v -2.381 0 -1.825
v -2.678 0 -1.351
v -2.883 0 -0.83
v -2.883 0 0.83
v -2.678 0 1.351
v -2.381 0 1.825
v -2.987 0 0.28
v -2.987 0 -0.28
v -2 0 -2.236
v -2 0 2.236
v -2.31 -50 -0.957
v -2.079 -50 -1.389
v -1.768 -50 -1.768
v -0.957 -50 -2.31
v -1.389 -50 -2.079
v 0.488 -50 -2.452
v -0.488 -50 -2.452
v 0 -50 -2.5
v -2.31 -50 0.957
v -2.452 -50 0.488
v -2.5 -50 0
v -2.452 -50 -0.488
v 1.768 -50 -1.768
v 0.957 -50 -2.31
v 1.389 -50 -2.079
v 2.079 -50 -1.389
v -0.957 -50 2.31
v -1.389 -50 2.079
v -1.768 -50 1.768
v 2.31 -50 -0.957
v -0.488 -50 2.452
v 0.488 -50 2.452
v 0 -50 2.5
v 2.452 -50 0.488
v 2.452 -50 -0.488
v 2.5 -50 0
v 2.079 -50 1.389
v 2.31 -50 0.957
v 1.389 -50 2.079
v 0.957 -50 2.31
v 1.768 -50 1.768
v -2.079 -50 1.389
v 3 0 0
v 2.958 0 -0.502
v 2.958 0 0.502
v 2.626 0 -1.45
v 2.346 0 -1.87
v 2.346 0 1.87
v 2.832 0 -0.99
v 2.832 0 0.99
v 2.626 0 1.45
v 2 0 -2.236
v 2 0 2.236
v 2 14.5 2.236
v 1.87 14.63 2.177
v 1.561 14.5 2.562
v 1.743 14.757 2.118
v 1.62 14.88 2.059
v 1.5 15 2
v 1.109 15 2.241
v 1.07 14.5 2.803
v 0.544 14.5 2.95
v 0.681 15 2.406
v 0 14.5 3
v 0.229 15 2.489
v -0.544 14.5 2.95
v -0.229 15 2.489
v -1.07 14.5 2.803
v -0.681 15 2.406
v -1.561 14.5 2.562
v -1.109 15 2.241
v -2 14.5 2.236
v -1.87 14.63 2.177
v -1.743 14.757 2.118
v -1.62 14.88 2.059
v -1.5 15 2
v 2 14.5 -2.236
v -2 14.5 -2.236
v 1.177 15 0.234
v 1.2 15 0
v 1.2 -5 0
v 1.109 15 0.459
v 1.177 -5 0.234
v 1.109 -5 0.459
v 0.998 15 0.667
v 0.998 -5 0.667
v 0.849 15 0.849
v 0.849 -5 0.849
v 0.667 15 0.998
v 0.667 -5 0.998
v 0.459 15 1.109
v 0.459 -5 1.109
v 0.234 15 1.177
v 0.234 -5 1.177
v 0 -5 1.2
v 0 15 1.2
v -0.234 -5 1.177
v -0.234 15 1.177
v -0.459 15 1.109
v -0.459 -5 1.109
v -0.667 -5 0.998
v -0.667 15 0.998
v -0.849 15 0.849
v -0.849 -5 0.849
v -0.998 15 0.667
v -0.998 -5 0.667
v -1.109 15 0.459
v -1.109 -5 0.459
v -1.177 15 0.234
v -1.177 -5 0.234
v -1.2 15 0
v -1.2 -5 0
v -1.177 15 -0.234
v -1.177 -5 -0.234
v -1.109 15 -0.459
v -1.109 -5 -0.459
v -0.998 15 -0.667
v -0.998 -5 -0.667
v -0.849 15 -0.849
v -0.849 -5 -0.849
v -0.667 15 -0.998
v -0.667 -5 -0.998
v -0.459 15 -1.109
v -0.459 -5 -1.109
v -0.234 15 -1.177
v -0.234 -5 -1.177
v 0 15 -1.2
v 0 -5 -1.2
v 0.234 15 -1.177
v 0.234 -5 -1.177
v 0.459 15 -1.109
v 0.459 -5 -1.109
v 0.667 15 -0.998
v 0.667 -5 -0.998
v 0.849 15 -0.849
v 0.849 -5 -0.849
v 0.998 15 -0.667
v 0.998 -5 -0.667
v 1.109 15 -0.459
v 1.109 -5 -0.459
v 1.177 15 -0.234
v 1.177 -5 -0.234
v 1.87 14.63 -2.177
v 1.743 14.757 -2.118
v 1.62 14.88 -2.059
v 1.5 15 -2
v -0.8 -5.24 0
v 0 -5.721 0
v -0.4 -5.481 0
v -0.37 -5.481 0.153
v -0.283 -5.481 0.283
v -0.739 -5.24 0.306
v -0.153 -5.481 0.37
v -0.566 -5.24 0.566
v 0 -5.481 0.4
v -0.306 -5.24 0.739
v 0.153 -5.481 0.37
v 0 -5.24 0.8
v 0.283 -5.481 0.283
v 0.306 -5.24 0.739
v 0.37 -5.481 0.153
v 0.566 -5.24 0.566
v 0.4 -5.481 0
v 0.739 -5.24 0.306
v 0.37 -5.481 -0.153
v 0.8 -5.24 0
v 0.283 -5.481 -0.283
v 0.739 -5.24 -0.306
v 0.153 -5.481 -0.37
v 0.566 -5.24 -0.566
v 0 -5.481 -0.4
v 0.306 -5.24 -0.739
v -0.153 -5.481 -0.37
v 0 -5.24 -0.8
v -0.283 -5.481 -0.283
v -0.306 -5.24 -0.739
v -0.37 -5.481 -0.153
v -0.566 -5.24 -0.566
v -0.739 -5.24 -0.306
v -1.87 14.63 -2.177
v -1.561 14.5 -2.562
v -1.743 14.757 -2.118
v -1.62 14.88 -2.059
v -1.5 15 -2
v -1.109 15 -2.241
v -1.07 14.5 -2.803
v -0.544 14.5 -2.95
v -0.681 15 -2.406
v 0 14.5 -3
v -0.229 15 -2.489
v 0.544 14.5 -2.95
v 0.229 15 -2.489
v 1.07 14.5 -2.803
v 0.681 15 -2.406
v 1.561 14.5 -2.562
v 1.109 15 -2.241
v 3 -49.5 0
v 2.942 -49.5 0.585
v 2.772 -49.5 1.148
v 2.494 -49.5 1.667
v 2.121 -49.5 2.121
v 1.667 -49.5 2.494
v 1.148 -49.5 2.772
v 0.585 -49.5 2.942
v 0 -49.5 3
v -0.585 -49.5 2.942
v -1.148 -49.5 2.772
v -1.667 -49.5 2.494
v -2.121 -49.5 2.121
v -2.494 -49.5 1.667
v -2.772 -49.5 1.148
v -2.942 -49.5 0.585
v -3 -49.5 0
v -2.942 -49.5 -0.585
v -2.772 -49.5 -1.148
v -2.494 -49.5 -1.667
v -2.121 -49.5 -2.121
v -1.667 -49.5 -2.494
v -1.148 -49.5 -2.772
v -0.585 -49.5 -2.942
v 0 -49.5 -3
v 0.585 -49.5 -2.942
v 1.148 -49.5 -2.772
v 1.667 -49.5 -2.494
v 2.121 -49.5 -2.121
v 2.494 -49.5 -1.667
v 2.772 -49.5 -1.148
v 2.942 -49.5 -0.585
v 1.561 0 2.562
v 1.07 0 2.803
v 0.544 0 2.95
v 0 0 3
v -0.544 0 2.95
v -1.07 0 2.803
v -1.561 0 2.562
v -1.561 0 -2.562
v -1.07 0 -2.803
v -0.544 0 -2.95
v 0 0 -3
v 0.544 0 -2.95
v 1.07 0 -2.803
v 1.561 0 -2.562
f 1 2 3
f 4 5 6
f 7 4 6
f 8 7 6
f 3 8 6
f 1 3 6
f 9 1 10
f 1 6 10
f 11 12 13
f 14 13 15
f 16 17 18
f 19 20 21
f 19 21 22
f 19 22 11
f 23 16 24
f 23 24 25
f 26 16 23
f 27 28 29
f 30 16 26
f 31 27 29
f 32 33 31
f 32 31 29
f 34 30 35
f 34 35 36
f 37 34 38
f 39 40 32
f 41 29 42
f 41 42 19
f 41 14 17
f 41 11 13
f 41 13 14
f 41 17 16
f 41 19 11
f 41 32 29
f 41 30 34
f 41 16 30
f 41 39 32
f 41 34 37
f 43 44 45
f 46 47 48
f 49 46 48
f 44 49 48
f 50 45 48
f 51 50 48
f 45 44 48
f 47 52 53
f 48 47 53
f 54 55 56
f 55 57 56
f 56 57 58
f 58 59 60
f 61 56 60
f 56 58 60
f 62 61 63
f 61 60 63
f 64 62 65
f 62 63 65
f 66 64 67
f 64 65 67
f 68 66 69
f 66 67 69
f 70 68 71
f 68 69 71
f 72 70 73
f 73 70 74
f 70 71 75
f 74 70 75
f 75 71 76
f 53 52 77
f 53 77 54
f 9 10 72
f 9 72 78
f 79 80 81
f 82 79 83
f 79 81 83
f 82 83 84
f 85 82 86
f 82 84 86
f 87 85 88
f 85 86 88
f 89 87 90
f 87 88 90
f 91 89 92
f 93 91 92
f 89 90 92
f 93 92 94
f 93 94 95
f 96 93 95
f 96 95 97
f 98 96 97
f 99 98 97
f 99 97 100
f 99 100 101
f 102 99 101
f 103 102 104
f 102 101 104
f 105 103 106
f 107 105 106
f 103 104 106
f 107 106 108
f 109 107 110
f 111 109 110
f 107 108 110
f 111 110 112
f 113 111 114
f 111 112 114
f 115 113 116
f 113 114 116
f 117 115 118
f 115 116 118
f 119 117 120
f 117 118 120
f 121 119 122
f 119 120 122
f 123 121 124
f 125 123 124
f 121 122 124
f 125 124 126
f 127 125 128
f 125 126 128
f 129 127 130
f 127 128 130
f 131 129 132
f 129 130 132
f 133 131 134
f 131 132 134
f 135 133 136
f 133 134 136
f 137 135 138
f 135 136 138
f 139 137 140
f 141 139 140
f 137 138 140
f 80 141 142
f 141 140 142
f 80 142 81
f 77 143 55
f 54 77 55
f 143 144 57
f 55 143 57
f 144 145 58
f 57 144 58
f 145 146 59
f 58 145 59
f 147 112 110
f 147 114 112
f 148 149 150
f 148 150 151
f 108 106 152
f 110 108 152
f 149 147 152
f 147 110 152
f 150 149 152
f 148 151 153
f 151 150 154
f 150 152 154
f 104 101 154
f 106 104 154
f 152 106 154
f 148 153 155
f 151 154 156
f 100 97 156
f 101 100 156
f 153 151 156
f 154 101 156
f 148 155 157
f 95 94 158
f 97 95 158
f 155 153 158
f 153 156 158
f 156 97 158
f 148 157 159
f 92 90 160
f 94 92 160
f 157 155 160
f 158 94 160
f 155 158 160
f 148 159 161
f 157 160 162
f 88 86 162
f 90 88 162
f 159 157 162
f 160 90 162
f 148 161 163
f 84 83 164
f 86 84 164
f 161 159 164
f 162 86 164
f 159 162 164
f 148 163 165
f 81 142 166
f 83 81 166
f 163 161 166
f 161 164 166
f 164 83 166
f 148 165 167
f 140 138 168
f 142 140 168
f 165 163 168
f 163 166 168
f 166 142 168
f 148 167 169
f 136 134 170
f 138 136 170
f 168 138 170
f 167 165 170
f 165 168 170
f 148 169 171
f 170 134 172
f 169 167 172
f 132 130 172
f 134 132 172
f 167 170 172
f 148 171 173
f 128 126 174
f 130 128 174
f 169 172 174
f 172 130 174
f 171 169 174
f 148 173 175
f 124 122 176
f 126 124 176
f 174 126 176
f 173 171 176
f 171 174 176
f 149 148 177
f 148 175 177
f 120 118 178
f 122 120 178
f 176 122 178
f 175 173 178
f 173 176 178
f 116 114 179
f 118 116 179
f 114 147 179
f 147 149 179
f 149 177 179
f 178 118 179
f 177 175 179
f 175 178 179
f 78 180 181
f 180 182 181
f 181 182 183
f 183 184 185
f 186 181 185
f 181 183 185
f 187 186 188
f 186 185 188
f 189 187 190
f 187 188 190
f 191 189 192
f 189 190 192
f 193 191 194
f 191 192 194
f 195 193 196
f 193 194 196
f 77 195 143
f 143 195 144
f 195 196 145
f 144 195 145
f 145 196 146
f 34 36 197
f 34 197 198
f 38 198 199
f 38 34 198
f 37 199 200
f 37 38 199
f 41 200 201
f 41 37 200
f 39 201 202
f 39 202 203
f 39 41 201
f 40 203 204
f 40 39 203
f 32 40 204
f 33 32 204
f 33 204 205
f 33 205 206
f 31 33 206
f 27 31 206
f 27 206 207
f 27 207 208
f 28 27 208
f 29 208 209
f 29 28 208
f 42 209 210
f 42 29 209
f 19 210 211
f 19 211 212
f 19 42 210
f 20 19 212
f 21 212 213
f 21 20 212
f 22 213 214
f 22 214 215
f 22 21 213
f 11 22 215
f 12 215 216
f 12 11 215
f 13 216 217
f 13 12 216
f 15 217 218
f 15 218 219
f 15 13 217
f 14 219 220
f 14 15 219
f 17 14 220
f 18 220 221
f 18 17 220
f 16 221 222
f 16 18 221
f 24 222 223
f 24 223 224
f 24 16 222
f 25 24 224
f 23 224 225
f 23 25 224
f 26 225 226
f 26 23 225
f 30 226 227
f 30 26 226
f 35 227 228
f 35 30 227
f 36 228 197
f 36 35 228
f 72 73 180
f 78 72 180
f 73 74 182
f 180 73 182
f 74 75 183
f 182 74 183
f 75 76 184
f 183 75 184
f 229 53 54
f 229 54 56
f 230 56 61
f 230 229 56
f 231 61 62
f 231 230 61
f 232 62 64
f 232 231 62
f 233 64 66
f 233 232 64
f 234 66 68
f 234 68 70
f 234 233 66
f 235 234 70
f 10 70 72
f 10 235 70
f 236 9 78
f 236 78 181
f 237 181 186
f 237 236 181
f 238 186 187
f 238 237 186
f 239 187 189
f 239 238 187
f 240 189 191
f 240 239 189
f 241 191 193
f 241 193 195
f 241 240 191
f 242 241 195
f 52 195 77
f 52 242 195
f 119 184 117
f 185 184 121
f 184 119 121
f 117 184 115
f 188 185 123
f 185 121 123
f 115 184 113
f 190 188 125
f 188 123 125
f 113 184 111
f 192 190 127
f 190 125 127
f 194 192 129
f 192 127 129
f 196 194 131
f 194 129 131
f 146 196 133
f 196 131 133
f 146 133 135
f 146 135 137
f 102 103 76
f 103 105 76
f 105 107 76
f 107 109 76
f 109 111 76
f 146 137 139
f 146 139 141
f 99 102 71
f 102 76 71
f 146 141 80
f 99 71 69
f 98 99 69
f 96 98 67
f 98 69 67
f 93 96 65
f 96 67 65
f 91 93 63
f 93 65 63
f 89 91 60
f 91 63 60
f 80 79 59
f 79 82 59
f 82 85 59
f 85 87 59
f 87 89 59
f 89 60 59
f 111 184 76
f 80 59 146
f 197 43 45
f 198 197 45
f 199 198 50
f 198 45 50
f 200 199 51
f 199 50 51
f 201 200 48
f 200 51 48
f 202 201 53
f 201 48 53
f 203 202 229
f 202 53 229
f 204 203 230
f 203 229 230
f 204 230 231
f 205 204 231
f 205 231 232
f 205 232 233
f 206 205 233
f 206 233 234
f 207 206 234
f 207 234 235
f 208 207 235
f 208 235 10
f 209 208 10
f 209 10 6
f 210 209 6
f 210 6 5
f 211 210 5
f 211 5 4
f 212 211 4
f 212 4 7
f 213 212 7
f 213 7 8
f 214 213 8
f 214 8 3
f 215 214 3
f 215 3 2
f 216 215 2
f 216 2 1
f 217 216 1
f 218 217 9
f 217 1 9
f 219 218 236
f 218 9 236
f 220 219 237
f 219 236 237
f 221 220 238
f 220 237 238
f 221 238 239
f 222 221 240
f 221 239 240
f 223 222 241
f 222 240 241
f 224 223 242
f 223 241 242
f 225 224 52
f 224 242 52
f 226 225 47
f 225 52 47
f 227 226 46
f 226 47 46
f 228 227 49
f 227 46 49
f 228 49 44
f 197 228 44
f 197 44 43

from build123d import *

# Parameters (mm, degrees)
F1_DEPTH = 15
F2_R     = 3
F3_DEPTH = 50
F4_SIZE  = 0.5
F7_D     = 2.4
F7_DEPTH = 20
F7_TIP   = 0.7210327428


with BuildPart() as f1:
    # F0 (on Front) → F1 (new body)
    with BuildSketch(Plane.XZ):
        with BuildLine():
            Line((-2, 2.2360679775), (-2, -2.2360679775))
            ThreePointArc((-2, -2.2360679775), (0, -3), (2, -2.2360679775))
            Line((2, -2.2360679775), (2, 2.2360679775))
            ThreePointArc((2, 2.2360679775), (0, 3), (-2, 2.2360679775))
        make_face()
    extrude(amount=-F1_DEPTH)

    # F2 (on Front) → F3 (join)
    with BuildSketch(Plane.XZ):
        Circle(F2_R)
    extrude(amount=F3_DEPTH)

    # F4
    f4_edges = [f1.edges().sort_by_distance(p)[0] for p in [
        (-3, -50, 0),
        (0, 15, 3),
        (-2, 15, 0),
        (0, 15, -3),
        (2, 15, 0),
    ]]
    chamfer(f4_edges, length=F4_SIZE)

    # F7
    with Locations(Plane(origin=(0, 15, 0), x_dir=(-1, 0, 0), z_dir=(0, 1, 0))):
        with Locations((0, 0)):
            Hole(F7_D / 2, depth=F7_DEPTH)
            with Locations((0, 0, -(F7_DEPTH + F7_TIP / 2))):  # 118° drill point
                Cone(0, F7_D / 2, F7_TIP, mode=Mode.SUBTRACT)


solid = f1.part
